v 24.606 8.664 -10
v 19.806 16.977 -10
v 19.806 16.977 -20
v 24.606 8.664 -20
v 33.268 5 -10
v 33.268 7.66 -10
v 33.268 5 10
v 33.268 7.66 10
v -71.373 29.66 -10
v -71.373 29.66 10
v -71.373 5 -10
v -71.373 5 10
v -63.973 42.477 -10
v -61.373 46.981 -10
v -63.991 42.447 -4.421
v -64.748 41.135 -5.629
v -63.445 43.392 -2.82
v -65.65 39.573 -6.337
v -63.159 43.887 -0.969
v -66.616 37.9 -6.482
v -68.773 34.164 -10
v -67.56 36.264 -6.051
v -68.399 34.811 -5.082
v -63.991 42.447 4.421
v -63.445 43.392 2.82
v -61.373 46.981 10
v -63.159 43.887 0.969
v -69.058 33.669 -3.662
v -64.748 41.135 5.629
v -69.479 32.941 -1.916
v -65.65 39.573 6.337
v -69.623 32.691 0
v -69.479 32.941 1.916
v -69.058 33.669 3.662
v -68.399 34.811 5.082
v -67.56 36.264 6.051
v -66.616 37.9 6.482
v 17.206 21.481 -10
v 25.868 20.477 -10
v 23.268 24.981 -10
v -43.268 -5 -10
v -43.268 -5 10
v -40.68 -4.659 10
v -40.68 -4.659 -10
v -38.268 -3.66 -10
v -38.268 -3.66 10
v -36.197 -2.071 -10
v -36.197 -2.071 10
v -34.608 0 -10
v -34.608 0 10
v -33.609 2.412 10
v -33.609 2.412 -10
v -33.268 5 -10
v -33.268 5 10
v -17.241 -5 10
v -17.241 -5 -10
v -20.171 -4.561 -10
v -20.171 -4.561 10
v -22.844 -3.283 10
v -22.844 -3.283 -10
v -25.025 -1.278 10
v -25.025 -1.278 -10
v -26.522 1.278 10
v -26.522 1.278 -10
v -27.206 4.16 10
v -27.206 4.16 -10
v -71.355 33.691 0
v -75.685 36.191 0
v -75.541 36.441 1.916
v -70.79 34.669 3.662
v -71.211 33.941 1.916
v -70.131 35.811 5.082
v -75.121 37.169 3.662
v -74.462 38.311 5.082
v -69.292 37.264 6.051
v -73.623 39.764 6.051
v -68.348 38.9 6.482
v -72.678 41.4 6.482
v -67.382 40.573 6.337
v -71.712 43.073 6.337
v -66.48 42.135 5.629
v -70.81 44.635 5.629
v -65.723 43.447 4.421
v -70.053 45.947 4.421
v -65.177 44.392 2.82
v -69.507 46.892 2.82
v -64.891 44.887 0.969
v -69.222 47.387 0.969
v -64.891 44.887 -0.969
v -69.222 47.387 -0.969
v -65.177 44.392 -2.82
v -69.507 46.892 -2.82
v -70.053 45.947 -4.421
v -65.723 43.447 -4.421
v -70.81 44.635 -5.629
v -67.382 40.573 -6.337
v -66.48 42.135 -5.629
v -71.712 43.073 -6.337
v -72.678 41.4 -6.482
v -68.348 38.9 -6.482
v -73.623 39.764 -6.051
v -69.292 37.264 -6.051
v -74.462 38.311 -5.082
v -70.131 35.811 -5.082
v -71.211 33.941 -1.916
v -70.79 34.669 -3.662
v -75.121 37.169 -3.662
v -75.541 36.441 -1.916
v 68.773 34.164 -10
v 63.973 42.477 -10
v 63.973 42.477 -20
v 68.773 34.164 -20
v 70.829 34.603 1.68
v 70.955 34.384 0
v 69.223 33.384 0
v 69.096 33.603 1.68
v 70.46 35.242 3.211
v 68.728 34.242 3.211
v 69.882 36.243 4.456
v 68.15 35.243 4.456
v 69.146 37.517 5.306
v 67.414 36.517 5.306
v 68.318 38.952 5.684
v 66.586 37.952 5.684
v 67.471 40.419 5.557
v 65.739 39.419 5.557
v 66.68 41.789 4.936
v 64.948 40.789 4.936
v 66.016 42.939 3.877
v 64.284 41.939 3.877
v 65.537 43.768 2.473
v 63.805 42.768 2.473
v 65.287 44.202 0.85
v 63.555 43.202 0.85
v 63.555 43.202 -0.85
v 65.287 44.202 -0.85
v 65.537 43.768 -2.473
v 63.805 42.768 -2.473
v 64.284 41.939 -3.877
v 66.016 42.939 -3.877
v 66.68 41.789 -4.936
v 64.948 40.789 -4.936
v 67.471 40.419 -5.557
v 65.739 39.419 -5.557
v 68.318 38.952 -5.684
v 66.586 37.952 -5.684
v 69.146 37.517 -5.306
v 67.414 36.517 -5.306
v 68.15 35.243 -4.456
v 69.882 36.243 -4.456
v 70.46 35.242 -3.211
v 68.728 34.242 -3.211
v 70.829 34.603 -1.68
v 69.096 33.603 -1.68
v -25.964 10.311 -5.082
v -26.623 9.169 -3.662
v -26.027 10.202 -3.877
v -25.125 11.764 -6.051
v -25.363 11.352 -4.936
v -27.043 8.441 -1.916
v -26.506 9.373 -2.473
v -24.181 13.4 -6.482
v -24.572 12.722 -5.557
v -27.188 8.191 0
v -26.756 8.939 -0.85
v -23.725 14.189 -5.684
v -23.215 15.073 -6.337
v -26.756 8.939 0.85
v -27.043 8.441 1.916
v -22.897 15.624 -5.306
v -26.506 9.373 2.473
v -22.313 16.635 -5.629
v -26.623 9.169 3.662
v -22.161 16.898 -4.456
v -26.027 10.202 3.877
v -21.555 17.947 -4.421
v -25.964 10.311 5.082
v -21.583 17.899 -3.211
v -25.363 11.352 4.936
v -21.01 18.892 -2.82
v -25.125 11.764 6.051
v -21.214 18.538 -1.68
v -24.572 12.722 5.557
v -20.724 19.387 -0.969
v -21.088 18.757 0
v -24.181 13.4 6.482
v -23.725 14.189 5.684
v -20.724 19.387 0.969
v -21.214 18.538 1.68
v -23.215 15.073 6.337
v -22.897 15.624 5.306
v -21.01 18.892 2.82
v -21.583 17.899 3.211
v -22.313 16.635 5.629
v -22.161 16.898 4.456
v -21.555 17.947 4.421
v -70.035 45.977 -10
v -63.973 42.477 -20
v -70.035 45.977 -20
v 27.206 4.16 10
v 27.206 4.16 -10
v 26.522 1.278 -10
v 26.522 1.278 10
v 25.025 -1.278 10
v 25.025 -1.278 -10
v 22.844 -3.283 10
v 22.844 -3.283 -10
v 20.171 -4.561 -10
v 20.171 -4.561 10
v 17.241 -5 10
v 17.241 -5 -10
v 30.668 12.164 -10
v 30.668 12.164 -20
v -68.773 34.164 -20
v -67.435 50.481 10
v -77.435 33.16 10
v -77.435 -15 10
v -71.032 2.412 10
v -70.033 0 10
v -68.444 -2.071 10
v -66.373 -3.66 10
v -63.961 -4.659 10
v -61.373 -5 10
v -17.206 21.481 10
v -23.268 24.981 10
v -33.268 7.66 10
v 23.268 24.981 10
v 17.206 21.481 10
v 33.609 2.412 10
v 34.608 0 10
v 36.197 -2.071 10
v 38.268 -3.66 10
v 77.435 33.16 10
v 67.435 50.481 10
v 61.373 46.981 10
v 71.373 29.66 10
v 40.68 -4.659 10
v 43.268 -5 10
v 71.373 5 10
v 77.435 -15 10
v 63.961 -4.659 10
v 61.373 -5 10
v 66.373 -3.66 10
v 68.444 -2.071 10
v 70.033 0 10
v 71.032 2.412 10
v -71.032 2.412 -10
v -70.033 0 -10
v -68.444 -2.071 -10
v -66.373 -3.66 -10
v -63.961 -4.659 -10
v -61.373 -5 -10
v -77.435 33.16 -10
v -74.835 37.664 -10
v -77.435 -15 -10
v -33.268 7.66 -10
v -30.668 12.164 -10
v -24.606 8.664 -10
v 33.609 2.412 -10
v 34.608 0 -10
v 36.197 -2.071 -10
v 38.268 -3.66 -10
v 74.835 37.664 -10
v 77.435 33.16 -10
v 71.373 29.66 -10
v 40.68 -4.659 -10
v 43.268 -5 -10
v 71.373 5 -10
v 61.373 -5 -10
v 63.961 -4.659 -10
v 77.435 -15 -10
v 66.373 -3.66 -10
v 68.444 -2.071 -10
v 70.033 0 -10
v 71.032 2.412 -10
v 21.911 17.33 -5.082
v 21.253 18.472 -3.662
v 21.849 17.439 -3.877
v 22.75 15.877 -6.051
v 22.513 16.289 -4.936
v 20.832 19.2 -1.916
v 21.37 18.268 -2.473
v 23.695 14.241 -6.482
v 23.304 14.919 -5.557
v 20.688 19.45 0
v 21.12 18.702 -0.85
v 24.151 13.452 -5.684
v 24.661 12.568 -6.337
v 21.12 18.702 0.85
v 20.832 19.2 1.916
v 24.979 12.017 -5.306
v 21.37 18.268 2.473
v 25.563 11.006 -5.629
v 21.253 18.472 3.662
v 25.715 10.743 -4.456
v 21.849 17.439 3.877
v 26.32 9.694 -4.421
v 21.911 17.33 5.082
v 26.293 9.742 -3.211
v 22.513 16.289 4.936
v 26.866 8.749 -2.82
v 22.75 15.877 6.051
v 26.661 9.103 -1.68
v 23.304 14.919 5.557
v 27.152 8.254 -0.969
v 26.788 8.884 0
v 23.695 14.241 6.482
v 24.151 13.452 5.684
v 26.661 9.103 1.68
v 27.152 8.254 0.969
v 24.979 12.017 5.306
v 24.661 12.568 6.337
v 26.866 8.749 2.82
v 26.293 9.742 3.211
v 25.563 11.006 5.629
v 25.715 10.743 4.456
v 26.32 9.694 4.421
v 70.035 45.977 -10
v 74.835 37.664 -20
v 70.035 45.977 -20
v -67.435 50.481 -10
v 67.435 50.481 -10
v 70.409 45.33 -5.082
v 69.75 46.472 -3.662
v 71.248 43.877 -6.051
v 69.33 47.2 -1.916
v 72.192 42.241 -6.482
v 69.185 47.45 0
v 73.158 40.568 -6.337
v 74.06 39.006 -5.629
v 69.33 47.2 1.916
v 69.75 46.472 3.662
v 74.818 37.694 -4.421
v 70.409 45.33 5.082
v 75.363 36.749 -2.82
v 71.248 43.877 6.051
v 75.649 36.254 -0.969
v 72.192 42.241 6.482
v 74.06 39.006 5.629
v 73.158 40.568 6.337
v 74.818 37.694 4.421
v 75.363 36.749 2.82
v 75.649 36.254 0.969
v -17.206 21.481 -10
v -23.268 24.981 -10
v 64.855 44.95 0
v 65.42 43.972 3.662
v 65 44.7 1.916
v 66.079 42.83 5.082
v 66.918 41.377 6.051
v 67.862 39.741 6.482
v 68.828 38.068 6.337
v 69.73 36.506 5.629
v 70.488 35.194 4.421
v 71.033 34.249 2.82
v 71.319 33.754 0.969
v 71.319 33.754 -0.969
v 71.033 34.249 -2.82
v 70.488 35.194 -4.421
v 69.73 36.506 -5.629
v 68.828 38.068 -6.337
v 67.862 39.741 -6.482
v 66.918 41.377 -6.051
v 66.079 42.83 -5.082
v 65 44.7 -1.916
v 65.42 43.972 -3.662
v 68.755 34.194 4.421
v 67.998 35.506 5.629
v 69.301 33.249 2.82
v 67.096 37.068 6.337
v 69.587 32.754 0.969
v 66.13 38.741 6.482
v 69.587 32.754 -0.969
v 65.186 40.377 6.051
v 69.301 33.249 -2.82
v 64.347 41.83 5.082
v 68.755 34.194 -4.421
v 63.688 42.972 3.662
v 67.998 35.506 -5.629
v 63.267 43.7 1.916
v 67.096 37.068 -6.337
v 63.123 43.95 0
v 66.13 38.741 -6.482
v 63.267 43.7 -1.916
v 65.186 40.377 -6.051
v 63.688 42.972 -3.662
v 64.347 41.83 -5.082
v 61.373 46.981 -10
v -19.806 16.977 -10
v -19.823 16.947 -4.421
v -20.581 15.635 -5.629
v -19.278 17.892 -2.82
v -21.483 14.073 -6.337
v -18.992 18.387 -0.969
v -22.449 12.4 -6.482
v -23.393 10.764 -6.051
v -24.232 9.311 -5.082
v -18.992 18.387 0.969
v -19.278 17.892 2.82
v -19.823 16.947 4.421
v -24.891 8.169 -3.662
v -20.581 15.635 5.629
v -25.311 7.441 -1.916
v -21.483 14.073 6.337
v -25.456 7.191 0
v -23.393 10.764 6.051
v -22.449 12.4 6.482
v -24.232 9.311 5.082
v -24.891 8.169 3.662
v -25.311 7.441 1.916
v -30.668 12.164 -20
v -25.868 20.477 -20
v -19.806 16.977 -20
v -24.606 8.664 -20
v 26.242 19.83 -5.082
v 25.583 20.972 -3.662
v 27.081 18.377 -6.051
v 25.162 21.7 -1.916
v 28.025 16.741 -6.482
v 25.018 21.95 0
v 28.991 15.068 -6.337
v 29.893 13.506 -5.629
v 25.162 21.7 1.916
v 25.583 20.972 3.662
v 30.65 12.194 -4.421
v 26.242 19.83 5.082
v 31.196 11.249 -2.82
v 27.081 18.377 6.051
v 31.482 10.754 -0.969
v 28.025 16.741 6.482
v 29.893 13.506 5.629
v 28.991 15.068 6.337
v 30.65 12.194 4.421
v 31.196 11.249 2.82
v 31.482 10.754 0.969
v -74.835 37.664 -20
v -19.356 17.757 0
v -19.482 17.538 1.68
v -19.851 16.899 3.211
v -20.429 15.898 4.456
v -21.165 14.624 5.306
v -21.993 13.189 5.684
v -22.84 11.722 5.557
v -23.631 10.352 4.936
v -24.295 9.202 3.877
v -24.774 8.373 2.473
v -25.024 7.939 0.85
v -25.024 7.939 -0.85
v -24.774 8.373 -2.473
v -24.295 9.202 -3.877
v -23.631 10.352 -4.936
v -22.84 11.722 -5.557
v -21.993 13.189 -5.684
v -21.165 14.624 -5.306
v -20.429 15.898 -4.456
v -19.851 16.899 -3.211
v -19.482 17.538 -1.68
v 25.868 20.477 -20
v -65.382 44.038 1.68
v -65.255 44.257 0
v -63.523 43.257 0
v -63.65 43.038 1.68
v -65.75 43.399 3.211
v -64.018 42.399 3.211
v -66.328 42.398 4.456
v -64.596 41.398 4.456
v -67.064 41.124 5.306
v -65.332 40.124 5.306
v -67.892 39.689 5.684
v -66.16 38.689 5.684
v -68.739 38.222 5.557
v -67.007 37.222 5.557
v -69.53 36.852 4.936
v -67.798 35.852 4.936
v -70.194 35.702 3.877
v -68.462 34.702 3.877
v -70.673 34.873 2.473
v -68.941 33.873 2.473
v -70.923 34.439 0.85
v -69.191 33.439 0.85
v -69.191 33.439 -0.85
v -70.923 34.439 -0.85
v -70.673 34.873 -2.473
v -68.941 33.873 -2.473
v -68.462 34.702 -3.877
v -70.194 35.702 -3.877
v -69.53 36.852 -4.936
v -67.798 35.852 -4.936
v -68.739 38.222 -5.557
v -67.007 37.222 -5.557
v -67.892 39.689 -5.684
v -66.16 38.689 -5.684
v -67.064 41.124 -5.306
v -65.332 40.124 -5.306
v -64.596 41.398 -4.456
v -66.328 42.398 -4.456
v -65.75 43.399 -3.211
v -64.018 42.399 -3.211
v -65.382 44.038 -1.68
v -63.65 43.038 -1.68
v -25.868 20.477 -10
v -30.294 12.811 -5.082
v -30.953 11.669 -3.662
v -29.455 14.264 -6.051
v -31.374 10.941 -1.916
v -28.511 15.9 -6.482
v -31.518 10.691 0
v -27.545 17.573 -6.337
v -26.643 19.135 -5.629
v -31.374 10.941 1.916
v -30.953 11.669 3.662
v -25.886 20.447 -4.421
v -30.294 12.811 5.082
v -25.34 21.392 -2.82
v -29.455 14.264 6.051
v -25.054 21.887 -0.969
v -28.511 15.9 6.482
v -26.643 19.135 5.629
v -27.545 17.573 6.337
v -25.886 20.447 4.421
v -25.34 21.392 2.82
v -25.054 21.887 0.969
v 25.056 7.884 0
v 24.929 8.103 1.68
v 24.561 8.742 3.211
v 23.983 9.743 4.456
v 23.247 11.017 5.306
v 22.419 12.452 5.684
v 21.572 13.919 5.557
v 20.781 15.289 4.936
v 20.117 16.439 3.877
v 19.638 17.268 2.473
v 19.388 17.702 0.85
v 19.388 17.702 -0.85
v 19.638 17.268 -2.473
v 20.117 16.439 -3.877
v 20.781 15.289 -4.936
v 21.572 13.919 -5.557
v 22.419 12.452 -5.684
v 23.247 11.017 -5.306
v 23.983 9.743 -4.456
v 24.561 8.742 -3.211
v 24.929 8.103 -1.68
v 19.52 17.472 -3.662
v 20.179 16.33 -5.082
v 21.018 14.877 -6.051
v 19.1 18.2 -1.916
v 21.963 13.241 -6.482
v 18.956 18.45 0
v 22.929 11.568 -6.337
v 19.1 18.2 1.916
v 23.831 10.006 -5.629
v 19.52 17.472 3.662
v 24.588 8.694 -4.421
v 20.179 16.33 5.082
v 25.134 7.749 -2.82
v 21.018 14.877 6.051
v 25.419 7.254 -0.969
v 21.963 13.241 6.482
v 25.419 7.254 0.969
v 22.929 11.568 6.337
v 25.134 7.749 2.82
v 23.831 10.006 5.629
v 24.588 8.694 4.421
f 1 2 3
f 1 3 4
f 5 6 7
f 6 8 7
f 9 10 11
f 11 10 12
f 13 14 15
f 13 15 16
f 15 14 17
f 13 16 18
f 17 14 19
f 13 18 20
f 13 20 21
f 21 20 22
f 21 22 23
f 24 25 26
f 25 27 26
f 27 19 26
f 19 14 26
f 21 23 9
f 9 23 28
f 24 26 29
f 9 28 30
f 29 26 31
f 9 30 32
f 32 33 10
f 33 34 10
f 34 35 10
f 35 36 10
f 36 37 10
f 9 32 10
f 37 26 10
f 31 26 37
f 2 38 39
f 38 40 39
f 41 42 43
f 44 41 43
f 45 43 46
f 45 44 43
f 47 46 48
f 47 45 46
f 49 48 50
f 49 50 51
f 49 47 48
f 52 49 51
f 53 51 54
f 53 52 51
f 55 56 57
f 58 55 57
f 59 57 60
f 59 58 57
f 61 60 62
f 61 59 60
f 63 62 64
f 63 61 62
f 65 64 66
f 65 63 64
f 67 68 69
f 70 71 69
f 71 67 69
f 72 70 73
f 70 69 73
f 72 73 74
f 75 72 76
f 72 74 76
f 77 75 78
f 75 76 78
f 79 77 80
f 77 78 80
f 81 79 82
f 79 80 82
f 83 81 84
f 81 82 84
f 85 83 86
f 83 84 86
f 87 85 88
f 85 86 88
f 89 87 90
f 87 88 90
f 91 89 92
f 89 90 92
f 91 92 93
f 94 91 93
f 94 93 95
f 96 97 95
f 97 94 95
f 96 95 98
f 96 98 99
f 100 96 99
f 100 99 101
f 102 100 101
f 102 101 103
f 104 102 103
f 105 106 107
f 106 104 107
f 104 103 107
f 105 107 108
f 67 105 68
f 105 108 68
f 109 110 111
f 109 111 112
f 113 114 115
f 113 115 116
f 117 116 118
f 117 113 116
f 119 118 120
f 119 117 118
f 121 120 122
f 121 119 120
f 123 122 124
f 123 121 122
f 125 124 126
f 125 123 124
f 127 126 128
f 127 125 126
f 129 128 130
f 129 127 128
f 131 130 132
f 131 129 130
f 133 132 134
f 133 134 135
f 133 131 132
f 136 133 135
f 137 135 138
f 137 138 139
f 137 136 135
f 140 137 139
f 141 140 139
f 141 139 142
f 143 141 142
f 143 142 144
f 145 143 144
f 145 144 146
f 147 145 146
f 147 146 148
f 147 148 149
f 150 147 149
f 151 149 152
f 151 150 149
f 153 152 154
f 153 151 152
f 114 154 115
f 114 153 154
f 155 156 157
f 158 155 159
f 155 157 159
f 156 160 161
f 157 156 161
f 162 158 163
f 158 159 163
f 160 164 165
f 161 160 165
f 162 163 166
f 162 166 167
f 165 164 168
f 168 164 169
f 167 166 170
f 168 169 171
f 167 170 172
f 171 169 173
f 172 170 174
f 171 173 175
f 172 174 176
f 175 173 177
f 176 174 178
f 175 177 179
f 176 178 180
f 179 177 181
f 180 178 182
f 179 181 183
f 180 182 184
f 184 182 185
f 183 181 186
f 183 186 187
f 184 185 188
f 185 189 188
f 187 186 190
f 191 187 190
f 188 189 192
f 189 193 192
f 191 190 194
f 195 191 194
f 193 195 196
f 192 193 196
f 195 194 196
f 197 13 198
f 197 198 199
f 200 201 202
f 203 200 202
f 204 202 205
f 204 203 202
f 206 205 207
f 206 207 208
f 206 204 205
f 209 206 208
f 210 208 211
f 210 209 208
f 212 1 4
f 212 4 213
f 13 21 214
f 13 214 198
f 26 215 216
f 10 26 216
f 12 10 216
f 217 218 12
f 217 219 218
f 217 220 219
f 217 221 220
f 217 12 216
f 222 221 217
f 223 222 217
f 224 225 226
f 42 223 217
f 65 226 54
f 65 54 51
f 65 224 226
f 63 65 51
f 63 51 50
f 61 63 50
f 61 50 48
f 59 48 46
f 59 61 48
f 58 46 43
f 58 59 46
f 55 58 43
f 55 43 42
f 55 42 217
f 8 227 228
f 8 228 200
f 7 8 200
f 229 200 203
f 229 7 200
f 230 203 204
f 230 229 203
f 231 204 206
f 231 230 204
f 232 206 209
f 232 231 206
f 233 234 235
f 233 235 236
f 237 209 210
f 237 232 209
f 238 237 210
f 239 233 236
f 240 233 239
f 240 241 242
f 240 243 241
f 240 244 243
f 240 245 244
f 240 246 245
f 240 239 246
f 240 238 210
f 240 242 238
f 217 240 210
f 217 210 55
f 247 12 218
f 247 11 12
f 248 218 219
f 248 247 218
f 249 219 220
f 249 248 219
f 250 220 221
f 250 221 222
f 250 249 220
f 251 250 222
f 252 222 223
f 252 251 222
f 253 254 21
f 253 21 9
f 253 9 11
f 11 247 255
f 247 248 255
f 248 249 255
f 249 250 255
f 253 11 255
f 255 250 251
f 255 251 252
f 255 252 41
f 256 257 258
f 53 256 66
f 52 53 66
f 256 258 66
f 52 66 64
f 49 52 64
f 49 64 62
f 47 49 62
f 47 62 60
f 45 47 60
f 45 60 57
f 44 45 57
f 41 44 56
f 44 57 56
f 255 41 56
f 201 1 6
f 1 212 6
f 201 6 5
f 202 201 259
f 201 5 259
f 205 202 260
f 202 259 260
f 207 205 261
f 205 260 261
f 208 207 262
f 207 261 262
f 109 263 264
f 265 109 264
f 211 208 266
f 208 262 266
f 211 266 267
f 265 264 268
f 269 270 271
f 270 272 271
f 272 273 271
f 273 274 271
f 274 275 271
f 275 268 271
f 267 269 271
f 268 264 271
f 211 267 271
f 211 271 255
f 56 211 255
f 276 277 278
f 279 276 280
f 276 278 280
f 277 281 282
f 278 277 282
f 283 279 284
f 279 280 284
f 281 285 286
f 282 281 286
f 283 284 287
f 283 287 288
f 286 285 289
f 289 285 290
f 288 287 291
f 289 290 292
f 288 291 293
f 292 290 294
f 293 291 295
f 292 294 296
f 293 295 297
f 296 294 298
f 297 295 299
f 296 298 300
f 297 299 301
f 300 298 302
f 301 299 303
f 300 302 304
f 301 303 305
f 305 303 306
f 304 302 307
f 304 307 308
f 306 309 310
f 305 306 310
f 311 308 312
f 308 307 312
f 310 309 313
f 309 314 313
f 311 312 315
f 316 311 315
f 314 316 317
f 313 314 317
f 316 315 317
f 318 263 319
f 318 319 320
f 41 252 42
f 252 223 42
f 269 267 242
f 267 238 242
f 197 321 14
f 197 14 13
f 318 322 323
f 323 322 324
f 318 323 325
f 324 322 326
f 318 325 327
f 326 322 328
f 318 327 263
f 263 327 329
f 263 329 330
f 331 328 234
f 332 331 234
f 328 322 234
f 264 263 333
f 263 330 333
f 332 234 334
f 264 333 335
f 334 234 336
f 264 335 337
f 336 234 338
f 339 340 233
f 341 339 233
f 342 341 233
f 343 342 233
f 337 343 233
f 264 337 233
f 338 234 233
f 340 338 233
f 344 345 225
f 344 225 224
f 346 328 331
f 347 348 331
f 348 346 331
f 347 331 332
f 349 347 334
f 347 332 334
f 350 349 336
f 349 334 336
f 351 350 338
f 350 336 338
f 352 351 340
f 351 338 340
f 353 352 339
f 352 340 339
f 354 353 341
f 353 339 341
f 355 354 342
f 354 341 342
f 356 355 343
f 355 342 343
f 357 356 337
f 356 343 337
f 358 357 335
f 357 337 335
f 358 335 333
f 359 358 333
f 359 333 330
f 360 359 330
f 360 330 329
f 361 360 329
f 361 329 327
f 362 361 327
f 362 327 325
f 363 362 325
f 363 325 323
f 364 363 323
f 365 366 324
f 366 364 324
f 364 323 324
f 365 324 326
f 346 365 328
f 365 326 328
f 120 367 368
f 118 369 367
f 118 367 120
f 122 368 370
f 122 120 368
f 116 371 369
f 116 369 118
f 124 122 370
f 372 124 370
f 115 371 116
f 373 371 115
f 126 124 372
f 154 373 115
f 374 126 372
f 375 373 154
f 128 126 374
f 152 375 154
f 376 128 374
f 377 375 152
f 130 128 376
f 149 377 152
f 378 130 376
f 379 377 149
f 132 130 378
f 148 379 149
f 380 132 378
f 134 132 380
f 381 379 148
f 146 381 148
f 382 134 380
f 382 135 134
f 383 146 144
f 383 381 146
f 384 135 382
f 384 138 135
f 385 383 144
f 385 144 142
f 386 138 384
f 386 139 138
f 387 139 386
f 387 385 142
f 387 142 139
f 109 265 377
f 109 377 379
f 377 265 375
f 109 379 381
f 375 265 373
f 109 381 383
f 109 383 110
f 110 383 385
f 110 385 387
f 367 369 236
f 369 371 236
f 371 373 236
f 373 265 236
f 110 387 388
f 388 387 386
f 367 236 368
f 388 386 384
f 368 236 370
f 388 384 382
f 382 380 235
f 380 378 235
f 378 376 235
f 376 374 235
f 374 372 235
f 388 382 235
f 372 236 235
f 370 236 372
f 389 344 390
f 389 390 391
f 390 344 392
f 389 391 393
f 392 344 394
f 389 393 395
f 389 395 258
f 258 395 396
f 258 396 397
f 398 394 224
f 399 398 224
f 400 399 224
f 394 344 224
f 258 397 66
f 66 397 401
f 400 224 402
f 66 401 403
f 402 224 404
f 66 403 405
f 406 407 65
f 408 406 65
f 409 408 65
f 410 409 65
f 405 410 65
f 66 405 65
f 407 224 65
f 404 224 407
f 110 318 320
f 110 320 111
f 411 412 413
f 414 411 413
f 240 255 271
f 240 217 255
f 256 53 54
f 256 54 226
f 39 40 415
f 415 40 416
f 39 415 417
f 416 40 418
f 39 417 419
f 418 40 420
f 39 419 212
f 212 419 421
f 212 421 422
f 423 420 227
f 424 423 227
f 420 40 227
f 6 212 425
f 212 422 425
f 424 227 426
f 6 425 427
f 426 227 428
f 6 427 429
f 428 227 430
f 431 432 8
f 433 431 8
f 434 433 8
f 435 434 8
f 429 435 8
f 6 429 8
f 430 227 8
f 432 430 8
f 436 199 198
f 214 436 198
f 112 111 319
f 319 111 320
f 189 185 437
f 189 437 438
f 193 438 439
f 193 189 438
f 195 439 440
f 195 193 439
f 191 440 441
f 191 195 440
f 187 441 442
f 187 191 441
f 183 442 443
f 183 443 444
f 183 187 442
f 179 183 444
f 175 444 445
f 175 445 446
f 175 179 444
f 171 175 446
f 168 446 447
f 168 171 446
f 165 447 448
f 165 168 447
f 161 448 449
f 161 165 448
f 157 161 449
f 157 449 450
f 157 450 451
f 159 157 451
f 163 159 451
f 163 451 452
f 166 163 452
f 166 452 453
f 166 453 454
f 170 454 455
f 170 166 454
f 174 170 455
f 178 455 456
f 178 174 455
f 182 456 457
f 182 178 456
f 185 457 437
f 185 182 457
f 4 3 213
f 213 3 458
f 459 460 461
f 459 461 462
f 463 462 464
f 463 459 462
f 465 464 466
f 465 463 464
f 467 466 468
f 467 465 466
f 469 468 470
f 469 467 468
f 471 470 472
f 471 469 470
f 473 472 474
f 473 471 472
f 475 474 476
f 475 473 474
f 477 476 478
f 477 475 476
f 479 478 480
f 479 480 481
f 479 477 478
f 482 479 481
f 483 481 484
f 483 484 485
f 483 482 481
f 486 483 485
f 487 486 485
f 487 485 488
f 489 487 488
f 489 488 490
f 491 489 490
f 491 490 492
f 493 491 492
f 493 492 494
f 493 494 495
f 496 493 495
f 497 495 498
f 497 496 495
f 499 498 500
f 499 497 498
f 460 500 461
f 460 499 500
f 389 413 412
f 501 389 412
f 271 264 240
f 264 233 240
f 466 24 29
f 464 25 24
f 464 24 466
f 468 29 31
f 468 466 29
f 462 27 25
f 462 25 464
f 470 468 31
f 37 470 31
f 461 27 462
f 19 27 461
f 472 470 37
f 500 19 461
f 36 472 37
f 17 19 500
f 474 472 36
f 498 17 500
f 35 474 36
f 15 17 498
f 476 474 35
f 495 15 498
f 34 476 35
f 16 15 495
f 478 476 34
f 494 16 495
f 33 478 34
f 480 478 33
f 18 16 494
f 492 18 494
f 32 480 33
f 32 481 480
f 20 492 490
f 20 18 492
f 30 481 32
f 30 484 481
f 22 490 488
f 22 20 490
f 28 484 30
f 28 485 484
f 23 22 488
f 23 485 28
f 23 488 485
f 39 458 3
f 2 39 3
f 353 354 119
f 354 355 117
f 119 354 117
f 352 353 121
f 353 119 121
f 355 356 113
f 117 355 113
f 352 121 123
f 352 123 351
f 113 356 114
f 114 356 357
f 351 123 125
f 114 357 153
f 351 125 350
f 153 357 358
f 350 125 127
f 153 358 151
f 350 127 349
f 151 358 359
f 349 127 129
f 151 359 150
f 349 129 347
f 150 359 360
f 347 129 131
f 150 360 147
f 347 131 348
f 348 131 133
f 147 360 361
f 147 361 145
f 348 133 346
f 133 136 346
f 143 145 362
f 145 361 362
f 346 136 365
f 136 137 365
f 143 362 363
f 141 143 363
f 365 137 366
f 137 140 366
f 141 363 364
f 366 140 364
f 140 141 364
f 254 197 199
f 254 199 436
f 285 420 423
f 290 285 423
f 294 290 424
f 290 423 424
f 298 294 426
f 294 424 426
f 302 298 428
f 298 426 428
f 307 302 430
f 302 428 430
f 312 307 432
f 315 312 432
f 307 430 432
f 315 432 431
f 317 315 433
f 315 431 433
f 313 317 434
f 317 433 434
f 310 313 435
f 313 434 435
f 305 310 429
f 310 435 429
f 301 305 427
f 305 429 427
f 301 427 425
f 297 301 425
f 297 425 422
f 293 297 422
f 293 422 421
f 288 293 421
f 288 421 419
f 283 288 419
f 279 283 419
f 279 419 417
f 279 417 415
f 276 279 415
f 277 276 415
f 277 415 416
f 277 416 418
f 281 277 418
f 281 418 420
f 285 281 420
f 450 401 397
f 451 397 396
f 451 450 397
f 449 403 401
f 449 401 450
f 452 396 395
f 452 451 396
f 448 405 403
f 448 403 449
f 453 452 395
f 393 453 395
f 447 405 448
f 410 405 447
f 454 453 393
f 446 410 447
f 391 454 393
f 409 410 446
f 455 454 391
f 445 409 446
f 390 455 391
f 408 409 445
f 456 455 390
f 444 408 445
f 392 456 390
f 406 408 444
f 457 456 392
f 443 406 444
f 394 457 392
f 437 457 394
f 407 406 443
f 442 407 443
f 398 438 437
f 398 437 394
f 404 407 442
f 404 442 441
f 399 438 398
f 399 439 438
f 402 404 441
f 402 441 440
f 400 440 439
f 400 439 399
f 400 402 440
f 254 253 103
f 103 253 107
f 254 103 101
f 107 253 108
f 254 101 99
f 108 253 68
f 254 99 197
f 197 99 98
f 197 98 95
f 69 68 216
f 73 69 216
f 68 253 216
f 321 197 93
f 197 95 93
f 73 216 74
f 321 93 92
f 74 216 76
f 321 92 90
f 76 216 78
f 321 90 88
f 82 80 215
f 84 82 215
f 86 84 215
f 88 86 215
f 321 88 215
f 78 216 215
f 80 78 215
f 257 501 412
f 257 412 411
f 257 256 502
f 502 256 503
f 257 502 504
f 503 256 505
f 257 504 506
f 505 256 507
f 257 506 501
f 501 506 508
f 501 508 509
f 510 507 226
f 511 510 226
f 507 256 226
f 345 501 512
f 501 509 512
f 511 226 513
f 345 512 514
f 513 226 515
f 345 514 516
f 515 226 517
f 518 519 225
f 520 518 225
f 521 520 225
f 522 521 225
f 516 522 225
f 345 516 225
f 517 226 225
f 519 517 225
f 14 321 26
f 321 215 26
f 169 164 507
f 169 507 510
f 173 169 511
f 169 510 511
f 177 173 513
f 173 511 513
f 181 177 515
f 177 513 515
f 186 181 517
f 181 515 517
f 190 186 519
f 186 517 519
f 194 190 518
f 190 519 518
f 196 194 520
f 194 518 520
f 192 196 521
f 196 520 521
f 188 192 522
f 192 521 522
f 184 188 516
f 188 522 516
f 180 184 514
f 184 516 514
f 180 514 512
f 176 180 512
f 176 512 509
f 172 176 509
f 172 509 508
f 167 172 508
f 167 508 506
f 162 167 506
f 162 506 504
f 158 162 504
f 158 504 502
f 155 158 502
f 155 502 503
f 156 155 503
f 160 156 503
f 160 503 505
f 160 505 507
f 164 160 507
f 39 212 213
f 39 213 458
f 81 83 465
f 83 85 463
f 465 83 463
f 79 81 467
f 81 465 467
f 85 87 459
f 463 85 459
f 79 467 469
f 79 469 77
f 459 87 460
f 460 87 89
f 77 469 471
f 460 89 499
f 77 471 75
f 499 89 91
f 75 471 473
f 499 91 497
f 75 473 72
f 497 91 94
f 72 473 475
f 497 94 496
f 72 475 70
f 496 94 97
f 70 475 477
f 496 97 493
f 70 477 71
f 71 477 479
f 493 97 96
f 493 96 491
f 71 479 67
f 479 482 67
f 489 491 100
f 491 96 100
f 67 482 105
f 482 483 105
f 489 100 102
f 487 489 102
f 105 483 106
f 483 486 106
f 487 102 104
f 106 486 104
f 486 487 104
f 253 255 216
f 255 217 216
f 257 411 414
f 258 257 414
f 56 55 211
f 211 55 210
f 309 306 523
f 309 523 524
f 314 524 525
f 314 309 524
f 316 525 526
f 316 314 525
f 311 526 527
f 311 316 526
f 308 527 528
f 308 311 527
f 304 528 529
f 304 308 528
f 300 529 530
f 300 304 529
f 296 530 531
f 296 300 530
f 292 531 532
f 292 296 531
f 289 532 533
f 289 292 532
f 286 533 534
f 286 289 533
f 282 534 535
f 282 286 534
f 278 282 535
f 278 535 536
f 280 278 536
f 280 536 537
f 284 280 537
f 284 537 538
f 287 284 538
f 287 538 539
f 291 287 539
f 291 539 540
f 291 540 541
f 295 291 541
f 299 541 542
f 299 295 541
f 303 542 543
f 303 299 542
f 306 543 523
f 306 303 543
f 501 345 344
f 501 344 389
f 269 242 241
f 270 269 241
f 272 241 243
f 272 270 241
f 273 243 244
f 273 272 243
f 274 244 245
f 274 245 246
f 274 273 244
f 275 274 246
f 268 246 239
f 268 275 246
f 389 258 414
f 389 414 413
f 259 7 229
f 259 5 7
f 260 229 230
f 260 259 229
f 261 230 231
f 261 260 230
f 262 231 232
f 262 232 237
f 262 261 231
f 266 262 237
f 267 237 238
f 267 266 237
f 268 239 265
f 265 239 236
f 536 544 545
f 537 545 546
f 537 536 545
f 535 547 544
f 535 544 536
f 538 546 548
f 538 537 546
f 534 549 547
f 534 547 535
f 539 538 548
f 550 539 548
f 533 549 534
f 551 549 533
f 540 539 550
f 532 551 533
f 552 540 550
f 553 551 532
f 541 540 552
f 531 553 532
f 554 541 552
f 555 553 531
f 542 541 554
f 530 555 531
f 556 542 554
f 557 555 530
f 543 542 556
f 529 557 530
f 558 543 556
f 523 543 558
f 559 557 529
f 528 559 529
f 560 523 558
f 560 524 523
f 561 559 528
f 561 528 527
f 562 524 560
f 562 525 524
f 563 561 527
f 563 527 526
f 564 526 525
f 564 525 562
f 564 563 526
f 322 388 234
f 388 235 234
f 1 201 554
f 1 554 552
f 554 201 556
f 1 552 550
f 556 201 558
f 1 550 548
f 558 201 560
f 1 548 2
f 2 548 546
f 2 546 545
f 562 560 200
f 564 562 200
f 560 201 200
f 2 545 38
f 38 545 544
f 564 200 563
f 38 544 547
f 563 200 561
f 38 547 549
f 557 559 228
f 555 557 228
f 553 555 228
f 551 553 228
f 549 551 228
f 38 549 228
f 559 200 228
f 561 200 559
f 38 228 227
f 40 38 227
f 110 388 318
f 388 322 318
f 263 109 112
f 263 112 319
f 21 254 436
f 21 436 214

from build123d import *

# Parameters (mm, degrees)
BOSS_EXTRU_1_DEPTH      = 10
ESQUISSE2_R             = 6.5
ENL_V_MAT_EXTRU_1_DEPTH = 63
ESQUISSE3_R             = 6.5
ENL_V_MAT_EXTRU_2_DEPTH = 63
CONG_1_R                = 10
CONG_2_R                = 10
BOSS_EXTRU_2_START      = -2
ESQUISSE4_R             = 6.5
ESQUISSE4_R_2           = 5.7
BOSS_EXTRU_2_DEPTH      = 2
BOSS_EXTRU_3_START      = -2
ESQUISSE5_R             = 6.5
ESQUISSE5_R_2           = 5.7
BOSS_EXTRU_3_DEPTH      = 2
BOSS_EXTRU_4_START      = -2
ESQUISSE6_R             = 6.5
ESQUISSE6_R_2           = 5.7
BOSS_EXTRU_4_DEPTH      = 2
BOSS_EXTRU_5_START      = -2
ESQUISSE7_R             = 6.5
ESQUISSE7_R_2           = 5.7
BOSS_EXTRU_5_DEPTH      = 2
BOSS_EXTRU_6_DEPTH      = 10


with BuildPart() as part:
    # Esquisse1 → Boss.-Extru.1 (new, symmetric)
    with BuildSketch(Plane.XY):
        Polygon((23.267949192, 24.980762114), (33.267949192, 7.660254038), (33.267949192, -5), (71.373066959, -5), (71.373066959, 29.660254038), (61.373066959, 46.980762114), (67.435244785, 50.480762114), (77.435244785, 33.160254038), (77.435244785, -15), (71.373066959, -15), (-71.373066959, -15), (-77.435244785, -15), (-77.435244785, 33.160254038), (-67.435244785, 50.480762114), (-61.373066959, 46.980762114), (-71.373066959, 29.660254038), (-71.373066959, -5), (-33.267949192, -5), (-33.267949192, 7.660254038), (-23.267949192, 24.980762114), (-17.205771366, 21.480762114), (-27.205771366, 4.160254038), (-27.205771366, -5), (27.205771366, -5), (27.205771366, 4.160254038), (17.205771366, 21.480762114), align=None)
    extrude(amount=BOSS_EXTRU_1_DEPTH, both=True)

    # Esquisse2 → Enlèv. mat.-Extru.1 (cut)
    with BuildSketch(Plane(origin=(-72.435244785, 41.820508076, 0), x_dir=(0, 0, 1), z_dir=(-0.8660254037844399, 0.4999999999999977, 0))):
        with Locations(Location((0, 0, 0), (0, 0, 270))):
            Circle(ESQUISSE2_R)
    extrude(amount=-ENL_V_MAT_EXTRU_1_DEPTH, mode=Mode.SUBTRACT)

    # Esquisse3 → Enlèv. mat.-Extru.2 (cut)
    with BuildSketch(Plane(origin=(72.435244785, 41.820508076, 0), x_dir=(0, 0, -1), z_dir=(0.86602540378444, 0.4999999999999975, 0))):
        with Locations(Location((0, 0, 0), (0, 0, 90))):
            Circle(ESQUISSE3_R)
    extrude(amount=-ENL_V_MAT_EXTRU_2_DEPTH, mode=Mode.SUBTRACT)

    # Congé1
    cong_1_edges = [part.edges().sort_by_distance(p)[0] for p in [
        (33.267949192, -5, 0),
        (71.373066959, -5, 0),
        (-71.373066959, -5, 0),
        (-33.267949192, -5, 0),
    ]]
    fillet(cong_1_edges, radius=CONG_1_R)

    # Congé2
    # the kernel refuses this fillet: 10 mm, written as the material it adds along each edge
    with BuildSketch(Plane(origin=(-27.205771366, -5, 10), x_dir=(1, 0, 0), z_dir=(0, 0, -1))) as cong_2_piece_1:
        with BuildLine():
            CenterArc((9.964678957, -10), CONG_2_R, 90, 85.182937258)
            Line((0, -9.160254038), (-0.199293579, -9.143459119))
            ThreePointArc((-0.199293579, -9.143459119), (-0.2, -4.580127019), (-0.2, 0))
            Line((-0.2, 0), (0, 0.2))
            Line((0, 0.2), (9.964678957, 0.2))
            Line((9.964678957, 0.2), (9.964678957, 0))
        make_face()
    extrude(amount=20)
    with BuildSketch(Plane(origin=(27.205771366, -5, 10), x_dir=(0, 1, 0), z_dir=(0, 0, -1))) as cong_2_piece_2:
        with BuildLine():
            CenterArc((10, -9.964678957), CONG_2_R, 94.817062742, 85.182937258)
            Line((0, -9.964678957), (-0.2, -9.964678957))
            Line((-0.2, -9.964678957), (-0.2, 0))
            Line((-0.2, 0), (0, 0.2))
            ThreePointArc((0, 0.2), (4.580127019, 0.2), (9.143459119, 0.199293579))
            Line((9.143459119, 0.199293579), (9.160254038, 0))
        make_face()
    extrude(amount=20)

    # Esquisse4 → Boss.-Extru.2 (add)
    with BuildSketch(Plane(origin=(-22.205771366, 12.820508076, 0), x_dir=(0, 0, -1), z_dir=(0.8660254037844398, -0.49999999999999817, 0)).offset(BOSS_EXTRU_2_START)):
        with Locations(Location((0, 0, 0), (0, 0, 90))):
            Circle(ESQUISSE4_R)
        with Locations(Location((0, 0, 0), (0, 0, 90))):
            Circle(ESQUISSE4_R_2, mode=Mode.SUBTRACT)
    extrude(amount=BOSS_EXTRU_2_DEPTH)

    # Esquisse5 → Boss.-Extru.3 (add)
    with BuildSketch(Plane(origin=(-66.373066959, 38.320508076, 0), x_dir=(0, 0, -1), z_dir=(0.8660254037844398, -0.49999999999999817, 0)).offset(BOSS_EXTRU_3_START)):
        with Locations(Location((0, 0, 0), (0, 0, 270))):
            Circle(ESQUISSE5_R)
        with Locations(Location((0, 0, 0), (0, 0, 90))):
            Circle(ESQUISSE5_R_2, mode=Mode.SUBTRACT)
    extrude(amount=BOSS_EXTRU_3_DEPTH)

    # Esquisse6 → Boss.-Extru.4 (add)
    with BuildSketch(Plane(origin=(22.205771366, 12.820508076, 0), x_dir=(0, 0, 1), z_dir=(-0.8660254037844398, -0.49999999999999817, 0)).offset(BOSS_EXTRU_4_START)):
        with Locations(Location((0, 0, 0), (0, 0, 270))):
            Circle(ESQUISSE6_R)
        with Locations(Location((0, 0, 0), (0, 0, 270))):
            Circle(ESQUISSE6_R_2, mode=Mode.SUBTRACT)
    extrude(amount=BOSS_EXTRU_4_DEPTH)

    # Esquisse7 → Boss.-Extru.5 (add)
    with BuildSketch(Plane(origin=(66.373066959, 38.320508076, 0), x_dir=(0, 0, 1), z_dir=(-0.8660254037844398, -0.49999999999999817, 0)).offset(BOSS_EXTRU_5_START)):
        with Locations(Location((0, 0, 0), (0, 0, 90))):
            Circle(ESQUISSE7_R)
        with Locations(Location((0, 0, 0), (0, 0, 270))):
            Circle(ESQUISSE7_R_2, mode=Mode.SUBTRACT)
    extrude(amount=BOSS_EXTRU_5_DEPTH)

    # Esquisse8 → Boss.-Extru.6 (add)
    with BuildSketch(Plane(origin=(0, 0, -10), x_dir=(-1, 0, 0), z_dir=(0, 0, -1))):
        Polygon((63.973066959, 42.477430014), (70.035244785, 45.977430014), (74.835244785, 37.663586138), (68.773066959, 34.163586138), align=None)
        Polygon((19.805771366, 16.977430014), (25.867949192, 20.477430014), (30.667949192, 12.163586138), (24.605771366, 8.663586138), align=None)
        Polygon((-25.867949192, 20.477430014), (-19.805771366, 16.977430014), (-24.605771366, 8.663586138), (-30.667949192, 12.163586138), align=None)
        Polygon((-70.035244785, 45.977430014), (-63.973066959, 42.477430014), (-68.773066959, 34.163586138), (-74.835244785, 37.663586138), align=None)
    extrude(amount=BOSS_EXTRU_6_DEPTH)


solid = part.part
